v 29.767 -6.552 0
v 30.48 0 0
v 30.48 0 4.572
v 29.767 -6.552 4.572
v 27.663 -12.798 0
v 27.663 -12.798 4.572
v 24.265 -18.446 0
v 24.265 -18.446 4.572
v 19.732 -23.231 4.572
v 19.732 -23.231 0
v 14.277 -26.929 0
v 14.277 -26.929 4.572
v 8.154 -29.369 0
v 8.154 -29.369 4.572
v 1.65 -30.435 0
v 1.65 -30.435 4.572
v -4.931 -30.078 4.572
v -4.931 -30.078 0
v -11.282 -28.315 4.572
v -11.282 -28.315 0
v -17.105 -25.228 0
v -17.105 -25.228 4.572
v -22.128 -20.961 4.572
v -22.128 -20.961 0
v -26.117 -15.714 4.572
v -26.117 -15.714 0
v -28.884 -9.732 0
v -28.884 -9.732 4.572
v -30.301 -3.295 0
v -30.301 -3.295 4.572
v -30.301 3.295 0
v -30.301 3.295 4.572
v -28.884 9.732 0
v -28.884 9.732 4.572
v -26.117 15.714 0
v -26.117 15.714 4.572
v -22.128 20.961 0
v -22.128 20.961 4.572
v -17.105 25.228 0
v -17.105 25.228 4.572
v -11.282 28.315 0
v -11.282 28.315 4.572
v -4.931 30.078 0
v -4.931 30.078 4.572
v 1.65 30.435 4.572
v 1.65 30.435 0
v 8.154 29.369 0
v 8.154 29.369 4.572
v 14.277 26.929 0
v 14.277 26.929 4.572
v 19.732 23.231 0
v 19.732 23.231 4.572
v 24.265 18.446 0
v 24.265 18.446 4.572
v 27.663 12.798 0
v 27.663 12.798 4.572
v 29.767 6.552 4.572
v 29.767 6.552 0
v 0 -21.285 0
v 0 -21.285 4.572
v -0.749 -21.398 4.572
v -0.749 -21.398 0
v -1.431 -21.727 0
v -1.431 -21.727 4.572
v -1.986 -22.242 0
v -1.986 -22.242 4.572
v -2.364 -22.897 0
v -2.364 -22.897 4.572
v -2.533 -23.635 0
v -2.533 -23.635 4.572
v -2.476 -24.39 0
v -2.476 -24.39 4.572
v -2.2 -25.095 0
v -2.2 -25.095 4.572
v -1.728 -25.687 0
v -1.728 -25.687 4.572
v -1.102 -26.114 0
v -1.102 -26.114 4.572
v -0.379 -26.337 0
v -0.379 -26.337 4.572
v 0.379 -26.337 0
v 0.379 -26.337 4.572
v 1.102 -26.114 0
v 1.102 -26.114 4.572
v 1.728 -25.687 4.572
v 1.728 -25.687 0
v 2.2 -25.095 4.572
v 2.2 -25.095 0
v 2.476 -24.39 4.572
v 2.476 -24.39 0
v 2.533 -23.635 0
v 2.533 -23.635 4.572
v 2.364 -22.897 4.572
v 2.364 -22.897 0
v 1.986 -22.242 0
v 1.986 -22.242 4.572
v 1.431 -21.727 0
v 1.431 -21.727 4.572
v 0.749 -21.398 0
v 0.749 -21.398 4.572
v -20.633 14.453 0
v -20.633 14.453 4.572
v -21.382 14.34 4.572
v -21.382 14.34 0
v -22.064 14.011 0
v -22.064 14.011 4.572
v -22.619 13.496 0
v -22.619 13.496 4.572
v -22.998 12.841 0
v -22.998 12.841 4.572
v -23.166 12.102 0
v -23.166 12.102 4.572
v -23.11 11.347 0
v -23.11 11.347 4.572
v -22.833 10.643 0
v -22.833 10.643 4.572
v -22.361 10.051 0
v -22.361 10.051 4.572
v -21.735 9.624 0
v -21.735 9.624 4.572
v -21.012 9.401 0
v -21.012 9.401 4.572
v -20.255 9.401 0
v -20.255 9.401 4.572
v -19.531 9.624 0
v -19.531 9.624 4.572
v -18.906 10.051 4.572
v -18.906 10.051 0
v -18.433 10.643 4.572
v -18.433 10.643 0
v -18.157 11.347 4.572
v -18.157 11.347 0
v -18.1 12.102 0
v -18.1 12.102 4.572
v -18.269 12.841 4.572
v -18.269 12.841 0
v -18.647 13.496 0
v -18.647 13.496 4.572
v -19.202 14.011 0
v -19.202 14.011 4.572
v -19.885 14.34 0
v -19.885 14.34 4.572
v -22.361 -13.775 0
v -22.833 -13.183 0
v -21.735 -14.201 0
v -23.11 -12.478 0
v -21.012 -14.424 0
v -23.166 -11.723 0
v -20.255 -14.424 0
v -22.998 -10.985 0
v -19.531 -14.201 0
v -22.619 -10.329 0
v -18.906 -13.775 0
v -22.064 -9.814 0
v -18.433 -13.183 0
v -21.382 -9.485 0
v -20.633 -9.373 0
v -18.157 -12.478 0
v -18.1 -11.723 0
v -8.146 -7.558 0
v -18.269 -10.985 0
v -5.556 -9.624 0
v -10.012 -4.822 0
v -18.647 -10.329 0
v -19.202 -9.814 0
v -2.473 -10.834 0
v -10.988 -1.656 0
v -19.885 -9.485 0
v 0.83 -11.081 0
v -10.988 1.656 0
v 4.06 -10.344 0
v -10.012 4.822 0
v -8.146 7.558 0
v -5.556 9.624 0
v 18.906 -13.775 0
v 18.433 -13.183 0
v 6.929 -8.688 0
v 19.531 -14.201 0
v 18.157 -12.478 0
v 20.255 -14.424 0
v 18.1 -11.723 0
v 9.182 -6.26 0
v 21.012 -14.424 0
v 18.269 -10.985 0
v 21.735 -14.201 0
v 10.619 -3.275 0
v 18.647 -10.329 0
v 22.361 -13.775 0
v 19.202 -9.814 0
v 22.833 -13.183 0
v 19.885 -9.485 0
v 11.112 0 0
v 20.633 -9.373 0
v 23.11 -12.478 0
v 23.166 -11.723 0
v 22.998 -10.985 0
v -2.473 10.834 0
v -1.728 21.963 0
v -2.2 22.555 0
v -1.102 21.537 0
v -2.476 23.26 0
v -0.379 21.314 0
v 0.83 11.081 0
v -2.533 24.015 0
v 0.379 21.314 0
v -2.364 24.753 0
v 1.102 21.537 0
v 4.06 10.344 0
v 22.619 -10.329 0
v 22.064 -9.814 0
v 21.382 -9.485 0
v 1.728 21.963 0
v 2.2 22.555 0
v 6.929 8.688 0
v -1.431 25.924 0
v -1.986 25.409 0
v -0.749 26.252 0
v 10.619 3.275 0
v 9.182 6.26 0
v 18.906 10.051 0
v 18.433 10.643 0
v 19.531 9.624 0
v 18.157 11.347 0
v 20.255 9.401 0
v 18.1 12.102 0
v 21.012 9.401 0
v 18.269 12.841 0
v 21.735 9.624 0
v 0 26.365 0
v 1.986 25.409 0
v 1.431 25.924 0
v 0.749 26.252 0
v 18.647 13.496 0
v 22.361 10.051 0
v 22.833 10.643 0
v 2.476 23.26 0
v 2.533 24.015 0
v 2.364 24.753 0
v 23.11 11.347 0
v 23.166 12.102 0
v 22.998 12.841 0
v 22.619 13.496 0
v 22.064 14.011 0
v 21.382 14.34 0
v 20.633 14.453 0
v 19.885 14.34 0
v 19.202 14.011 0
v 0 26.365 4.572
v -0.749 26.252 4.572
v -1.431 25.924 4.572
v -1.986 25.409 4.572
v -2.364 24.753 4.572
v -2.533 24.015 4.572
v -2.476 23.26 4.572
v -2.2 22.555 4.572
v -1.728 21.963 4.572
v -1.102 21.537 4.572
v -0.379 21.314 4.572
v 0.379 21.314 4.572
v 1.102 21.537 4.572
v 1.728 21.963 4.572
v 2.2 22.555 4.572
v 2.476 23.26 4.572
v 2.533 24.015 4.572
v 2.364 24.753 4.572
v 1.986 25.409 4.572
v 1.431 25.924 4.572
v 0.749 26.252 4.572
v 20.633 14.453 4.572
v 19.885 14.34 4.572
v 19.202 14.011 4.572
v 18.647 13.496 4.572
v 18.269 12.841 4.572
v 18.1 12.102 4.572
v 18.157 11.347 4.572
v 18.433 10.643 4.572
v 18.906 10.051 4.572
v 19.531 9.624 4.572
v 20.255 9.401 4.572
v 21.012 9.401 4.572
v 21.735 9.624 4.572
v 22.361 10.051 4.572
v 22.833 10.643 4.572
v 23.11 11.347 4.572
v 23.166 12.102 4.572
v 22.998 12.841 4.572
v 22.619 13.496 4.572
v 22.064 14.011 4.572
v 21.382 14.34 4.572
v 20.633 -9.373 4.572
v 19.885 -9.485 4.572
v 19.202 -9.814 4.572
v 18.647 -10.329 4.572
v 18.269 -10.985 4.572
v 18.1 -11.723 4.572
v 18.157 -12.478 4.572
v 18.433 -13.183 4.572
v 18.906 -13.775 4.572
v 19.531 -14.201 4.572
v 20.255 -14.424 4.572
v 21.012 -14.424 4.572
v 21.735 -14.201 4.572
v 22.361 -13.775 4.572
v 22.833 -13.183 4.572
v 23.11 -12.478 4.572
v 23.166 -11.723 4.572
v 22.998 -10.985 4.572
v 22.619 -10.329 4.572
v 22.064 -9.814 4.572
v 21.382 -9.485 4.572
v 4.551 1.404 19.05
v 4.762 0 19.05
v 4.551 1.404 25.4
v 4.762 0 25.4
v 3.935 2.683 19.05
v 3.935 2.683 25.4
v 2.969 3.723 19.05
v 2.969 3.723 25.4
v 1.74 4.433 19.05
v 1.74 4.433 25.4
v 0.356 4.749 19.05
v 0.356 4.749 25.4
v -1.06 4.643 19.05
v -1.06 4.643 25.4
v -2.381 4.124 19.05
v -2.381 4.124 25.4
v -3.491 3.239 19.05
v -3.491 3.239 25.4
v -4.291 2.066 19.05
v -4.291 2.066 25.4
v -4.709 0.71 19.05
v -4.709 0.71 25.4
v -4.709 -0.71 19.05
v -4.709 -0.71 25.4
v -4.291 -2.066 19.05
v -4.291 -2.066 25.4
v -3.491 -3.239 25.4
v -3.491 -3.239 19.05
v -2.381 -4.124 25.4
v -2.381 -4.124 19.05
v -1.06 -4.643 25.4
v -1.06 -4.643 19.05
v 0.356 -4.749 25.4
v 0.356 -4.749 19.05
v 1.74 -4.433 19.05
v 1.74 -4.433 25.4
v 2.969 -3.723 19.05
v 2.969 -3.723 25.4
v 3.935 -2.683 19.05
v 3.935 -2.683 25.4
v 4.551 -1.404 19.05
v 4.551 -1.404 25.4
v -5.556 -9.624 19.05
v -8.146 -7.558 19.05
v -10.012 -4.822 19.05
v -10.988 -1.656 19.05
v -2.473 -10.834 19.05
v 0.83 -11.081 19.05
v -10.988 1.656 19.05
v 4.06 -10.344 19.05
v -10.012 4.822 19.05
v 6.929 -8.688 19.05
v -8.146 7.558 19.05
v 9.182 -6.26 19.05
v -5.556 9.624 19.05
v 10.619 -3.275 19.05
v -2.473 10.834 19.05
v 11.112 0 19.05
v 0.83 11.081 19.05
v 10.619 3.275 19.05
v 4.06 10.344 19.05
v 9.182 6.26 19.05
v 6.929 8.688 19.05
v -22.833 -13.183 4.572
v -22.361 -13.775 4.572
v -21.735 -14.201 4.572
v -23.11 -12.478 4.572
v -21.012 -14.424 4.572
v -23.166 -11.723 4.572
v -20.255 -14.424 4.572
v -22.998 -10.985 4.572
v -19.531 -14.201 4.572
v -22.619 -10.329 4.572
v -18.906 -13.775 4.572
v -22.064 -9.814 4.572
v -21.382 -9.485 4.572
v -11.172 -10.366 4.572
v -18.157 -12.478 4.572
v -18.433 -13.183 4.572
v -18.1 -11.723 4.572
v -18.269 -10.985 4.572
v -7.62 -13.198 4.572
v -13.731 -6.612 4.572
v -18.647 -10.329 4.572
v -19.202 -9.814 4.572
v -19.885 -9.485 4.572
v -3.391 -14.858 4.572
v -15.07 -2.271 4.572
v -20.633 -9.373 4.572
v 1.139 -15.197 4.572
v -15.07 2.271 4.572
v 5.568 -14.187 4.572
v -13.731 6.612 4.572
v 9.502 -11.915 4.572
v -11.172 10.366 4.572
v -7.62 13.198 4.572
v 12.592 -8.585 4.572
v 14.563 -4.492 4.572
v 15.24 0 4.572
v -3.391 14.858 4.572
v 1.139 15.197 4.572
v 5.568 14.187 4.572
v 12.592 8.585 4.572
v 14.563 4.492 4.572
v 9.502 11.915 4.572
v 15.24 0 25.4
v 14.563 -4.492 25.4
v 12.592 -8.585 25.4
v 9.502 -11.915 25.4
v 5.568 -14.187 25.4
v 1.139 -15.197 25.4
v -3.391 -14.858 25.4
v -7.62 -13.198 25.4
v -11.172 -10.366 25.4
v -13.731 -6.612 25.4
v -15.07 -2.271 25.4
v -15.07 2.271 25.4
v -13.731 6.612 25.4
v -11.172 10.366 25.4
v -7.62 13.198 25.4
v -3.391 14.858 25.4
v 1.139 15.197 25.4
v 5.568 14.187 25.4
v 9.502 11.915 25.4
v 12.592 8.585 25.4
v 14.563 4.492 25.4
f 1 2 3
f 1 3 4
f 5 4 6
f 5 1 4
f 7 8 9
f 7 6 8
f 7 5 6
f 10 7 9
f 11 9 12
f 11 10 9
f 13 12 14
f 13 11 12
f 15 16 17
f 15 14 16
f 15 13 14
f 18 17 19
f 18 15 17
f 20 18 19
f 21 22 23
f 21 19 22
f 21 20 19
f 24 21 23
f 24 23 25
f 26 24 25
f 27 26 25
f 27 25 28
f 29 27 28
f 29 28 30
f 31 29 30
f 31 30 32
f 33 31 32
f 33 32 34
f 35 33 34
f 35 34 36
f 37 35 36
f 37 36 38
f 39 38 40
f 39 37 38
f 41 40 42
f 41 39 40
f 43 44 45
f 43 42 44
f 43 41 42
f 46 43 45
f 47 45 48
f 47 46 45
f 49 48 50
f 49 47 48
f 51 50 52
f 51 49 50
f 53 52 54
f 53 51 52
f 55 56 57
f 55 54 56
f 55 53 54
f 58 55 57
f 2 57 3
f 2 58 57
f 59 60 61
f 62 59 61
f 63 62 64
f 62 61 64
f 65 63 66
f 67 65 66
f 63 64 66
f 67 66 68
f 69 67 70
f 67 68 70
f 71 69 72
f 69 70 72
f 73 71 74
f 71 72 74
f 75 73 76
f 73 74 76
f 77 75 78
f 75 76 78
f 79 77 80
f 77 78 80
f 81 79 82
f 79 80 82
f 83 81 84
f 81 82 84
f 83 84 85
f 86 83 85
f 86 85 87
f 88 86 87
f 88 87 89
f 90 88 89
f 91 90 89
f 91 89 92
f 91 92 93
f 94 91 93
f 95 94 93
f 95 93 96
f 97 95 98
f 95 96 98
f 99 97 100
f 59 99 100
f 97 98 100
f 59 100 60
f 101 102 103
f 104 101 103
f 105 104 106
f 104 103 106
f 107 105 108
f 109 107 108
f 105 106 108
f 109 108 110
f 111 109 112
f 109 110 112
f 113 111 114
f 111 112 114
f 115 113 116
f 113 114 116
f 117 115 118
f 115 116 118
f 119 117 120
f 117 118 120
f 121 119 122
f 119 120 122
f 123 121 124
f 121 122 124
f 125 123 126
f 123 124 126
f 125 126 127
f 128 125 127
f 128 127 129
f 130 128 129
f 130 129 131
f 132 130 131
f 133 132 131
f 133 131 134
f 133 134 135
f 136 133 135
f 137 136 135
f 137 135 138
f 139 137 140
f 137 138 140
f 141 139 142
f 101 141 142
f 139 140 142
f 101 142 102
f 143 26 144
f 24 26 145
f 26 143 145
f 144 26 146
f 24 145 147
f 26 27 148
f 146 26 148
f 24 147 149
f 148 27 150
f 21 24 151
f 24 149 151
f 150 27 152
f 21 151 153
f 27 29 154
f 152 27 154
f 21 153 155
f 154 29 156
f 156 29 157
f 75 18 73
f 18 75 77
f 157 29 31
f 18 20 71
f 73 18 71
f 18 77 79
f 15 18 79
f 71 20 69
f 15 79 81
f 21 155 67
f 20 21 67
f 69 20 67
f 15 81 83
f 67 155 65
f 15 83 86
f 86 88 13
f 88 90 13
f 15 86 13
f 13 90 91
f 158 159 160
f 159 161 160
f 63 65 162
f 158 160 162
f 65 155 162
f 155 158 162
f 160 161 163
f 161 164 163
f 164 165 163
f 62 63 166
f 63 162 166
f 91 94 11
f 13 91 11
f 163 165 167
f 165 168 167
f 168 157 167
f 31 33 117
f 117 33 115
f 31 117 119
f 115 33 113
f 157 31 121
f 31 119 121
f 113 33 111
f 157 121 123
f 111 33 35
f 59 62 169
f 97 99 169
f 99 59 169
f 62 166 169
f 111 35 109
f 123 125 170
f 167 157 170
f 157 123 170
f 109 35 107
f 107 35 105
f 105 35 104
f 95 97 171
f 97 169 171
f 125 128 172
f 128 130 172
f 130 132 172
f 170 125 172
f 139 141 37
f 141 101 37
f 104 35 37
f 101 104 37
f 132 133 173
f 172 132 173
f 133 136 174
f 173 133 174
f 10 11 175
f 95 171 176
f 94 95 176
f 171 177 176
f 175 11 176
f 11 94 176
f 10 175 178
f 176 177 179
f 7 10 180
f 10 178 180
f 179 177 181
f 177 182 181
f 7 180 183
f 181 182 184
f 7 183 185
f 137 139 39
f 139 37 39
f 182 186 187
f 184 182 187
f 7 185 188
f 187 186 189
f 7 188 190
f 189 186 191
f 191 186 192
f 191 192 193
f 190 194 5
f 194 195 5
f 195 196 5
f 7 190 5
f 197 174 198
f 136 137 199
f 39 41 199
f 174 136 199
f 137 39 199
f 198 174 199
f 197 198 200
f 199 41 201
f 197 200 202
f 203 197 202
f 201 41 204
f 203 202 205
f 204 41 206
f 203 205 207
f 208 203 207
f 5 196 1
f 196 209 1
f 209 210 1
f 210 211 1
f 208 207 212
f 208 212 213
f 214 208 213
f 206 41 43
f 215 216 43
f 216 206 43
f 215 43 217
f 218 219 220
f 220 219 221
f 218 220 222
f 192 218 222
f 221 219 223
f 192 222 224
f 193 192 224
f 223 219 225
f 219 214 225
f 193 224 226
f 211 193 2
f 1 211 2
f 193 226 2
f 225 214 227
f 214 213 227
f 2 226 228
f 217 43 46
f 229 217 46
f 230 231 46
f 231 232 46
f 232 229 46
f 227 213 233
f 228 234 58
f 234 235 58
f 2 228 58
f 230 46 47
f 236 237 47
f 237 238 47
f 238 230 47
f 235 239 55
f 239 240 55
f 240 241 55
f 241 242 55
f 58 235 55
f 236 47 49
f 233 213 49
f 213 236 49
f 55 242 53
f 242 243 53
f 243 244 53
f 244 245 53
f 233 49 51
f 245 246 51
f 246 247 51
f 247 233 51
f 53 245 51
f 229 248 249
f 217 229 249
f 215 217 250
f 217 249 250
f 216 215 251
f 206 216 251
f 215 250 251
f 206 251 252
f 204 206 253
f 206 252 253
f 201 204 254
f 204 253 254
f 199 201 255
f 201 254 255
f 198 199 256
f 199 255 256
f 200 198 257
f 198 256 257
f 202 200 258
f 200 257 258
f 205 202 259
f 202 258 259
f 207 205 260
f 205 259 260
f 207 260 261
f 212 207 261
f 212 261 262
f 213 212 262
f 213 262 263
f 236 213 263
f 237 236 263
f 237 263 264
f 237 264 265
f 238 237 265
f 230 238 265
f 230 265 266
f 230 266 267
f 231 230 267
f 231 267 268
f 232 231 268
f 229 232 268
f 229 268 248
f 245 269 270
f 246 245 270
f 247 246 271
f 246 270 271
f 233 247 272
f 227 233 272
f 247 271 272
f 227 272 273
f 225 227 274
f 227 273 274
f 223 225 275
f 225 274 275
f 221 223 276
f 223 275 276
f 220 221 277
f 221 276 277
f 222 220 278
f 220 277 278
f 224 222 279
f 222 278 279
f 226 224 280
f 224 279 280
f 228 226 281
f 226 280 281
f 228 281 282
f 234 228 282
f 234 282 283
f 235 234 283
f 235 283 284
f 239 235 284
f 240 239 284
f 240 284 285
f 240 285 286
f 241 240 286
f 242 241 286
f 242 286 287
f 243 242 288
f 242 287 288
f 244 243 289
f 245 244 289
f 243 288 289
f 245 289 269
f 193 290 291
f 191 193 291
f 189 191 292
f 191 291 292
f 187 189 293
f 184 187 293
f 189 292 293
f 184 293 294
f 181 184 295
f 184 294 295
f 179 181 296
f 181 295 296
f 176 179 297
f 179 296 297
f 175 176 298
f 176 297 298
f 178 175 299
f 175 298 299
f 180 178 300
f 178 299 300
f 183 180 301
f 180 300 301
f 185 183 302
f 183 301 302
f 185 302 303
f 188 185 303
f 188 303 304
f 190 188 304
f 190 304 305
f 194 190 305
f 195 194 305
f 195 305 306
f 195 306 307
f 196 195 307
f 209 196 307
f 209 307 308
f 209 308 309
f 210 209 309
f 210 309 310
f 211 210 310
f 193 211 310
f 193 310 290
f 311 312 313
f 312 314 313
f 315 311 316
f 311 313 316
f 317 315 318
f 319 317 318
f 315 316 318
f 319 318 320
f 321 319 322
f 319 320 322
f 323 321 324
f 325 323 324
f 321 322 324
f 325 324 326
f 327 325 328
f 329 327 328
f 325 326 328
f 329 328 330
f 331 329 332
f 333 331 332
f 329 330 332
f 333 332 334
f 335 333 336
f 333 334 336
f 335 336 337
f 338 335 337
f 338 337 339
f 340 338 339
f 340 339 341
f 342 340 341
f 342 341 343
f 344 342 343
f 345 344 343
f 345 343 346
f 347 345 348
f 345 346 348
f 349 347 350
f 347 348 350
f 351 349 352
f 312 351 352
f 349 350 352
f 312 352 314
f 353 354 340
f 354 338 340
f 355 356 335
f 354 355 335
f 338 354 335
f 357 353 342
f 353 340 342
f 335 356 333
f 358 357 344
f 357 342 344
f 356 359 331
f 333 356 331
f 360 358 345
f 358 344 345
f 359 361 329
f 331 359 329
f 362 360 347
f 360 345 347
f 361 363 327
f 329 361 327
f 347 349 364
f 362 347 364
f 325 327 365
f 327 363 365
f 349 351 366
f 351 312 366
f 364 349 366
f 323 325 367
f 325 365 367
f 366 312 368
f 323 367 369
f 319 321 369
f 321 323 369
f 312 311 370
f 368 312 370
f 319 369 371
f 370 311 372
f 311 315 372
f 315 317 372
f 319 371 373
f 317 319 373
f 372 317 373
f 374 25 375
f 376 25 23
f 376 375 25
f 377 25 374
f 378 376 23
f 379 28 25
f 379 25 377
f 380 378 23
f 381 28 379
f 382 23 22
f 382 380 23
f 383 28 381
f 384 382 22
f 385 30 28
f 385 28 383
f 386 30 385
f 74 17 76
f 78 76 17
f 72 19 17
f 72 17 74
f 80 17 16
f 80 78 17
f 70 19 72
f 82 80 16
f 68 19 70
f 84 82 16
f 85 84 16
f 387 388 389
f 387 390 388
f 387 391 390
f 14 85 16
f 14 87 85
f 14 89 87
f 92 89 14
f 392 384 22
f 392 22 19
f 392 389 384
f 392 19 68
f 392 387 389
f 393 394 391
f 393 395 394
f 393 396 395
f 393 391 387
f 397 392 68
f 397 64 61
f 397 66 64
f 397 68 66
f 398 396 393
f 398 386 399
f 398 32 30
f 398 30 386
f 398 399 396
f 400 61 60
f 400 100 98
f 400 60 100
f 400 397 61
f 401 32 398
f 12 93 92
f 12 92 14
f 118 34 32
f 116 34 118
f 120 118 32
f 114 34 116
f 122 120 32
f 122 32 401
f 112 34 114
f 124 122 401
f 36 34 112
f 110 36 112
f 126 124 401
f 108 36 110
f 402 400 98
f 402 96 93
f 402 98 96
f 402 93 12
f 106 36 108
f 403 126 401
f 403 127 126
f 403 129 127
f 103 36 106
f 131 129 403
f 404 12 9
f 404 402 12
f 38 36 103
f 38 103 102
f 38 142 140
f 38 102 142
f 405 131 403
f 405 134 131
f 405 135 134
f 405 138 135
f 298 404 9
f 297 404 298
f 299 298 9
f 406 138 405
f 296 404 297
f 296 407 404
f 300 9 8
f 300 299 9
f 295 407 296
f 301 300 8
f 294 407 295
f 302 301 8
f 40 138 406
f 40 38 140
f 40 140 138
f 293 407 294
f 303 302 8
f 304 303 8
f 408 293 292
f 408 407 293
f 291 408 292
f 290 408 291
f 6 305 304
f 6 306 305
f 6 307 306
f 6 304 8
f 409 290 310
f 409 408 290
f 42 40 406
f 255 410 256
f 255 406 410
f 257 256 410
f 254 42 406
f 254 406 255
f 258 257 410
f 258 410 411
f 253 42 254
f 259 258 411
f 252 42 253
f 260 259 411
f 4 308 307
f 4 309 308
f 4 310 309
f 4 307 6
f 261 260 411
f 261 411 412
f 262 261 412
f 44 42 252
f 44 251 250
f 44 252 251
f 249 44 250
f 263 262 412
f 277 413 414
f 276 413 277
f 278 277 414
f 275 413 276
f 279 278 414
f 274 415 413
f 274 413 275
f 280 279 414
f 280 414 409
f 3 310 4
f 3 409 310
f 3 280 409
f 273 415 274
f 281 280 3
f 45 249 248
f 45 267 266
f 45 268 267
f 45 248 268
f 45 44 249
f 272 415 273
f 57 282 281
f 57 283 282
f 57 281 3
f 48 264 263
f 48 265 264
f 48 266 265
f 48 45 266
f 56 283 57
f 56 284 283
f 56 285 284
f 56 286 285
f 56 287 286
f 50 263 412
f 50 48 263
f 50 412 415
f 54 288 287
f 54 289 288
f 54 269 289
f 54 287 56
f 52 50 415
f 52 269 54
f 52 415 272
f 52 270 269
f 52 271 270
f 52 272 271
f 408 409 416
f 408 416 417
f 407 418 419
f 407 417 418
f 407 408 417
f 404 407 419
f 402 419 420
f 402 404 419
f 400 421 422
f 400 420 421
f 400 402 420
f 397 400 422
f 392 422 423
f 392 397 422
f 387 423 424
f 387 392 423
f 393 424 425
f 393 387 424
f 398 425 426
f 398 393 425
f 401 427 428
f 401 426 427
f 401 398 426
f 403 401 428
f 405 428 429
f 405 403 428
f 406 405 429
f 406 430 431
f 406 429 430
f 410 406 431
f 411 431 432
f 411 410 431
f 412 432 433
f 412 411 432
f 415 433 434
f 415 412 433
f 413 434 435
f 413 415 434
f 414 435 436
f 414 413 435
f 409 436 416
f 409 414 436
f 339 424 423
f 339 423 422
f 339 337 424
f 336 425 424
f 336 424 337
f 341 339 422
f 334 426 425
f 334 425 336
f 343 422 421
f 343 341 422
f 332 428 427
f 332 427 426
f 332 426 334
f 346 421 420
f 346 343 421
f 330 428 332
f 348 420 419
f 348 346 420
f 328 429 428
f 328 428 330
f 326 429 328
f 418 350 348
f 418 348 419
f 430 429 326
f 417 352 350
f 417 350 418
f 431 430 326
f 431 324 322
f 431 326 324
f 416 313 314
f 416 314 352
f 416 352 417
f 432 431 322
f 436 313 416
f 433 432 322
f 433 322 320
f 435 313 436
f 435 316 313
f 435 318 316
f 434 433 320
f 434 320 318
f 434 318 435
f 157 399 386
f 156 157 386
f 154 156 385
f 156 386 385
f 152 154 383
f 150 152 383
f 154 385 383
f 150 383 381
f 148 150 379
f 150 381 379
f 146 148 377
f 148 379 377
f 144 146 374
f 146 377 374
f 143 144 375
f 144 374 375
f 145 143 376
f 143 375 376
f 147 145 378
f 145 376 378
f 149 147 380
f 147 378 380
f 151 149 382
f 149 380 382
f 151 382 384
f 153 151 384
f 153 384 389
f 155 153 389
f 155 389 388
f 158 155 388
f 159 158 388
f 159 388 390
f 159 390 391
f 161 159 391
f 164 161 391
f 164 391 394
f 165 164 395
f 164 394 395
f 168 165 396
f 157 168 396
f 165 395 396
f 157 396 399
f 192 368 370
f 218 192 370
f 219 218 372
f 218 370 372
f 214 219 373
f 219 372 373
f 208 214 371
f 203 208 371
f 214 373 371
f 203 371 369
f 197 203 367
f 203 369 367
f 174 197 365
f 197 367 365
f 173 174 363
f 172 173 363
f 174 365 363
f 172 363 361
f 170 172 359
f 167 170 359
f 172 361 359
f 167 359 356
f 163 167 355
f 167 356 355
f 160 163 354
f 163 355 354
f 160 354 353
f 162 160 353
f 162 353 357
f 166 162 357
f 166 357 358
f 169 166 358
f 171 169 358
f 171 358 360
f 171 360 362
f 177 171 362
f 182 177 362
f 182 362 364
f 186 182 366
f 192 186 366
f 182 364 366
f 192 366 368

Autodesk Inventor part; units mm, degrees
ref_plane "YZ Plane" through (0, 0, 0) normal (1, 0, 0) x (0, 1, 0)
ref_plane "XZ Plane" through (0, 0, 0) normal (0, 1, 0) x (-1, 0, 0)
ref_plane "XY Plane" through (0, 0, 0) normal (0, 0, 1) x (1, 0, 0)
sketch "Sketch1" plane through (0, 0, 0) normal (0, 0, 1) x (1, 0, 0)
  circle A0 centre (0, 0) radius 30.48
  dimension "d0" = 60.96
extrude "Extrusion1" add sketch "Sketch1" along normal blind 4.572
sketch "Sketch2" plane through (0, 0, 4.572) normal (0, 0, 1) x (1, 0, 0)
  circle A0 centre (0, 0) radius 15.24
  dimension "d3" = 30.48
extrude "Extrusion2" add sketch "Sketch2" along normal blind 20.828
sketch "Sketch3" plane through (0, 0, 25.4) normal (0, 0, 1) x (1, 0, 0)
  circle A0 centre (0, 0) radius 11.1125
  dimension "d6" = 22.225
extrude "Extrusion3" cut sketch "Sketch3" against normal blind 25.4
sketch "Sketch4" plane through (0, 0, 0) normal (0, 0, -1) x (-1, 0, 0)
  circle A0 centre (0, 0) radius 23.8252
  point P0 (0, 23.8252)
  point P1 (-20.6332, 11.9126)
  point P2 (-20.6332, -11.9126)
  point P3 (0, -23.8252)
  point P4 (20.6332, -11.9126)
  point P5 (20.6332, 11.9126)
  dimension "d9" = 23.8252
  dimension "d12" = 360
hole "Hole1" at (0, 23.8252, 0) at (20.6332, 11.9126, 0) at (20.6332, -11.9126, 0) at (0, -23.8252, 0) at (-20.6332, -11.9126, 0) at (-20.6332, 11.9126, 0) direction (0, 0, 1) diameter 5.08 end through all
sketch "Sketch5" plane through (0, 0, 25.4) normal (0, 0, 1) x (1, 0, 0)
  circle A0 centre (0, 0) radius 11.1125 projected
  circle A1 centre (0, 0) radius 4.7625
  dimension "d21" = 9.525
extrude "Extrusion4" add sketch "Sketch5" against normal blind 6.35
properties part number "KHUB"
